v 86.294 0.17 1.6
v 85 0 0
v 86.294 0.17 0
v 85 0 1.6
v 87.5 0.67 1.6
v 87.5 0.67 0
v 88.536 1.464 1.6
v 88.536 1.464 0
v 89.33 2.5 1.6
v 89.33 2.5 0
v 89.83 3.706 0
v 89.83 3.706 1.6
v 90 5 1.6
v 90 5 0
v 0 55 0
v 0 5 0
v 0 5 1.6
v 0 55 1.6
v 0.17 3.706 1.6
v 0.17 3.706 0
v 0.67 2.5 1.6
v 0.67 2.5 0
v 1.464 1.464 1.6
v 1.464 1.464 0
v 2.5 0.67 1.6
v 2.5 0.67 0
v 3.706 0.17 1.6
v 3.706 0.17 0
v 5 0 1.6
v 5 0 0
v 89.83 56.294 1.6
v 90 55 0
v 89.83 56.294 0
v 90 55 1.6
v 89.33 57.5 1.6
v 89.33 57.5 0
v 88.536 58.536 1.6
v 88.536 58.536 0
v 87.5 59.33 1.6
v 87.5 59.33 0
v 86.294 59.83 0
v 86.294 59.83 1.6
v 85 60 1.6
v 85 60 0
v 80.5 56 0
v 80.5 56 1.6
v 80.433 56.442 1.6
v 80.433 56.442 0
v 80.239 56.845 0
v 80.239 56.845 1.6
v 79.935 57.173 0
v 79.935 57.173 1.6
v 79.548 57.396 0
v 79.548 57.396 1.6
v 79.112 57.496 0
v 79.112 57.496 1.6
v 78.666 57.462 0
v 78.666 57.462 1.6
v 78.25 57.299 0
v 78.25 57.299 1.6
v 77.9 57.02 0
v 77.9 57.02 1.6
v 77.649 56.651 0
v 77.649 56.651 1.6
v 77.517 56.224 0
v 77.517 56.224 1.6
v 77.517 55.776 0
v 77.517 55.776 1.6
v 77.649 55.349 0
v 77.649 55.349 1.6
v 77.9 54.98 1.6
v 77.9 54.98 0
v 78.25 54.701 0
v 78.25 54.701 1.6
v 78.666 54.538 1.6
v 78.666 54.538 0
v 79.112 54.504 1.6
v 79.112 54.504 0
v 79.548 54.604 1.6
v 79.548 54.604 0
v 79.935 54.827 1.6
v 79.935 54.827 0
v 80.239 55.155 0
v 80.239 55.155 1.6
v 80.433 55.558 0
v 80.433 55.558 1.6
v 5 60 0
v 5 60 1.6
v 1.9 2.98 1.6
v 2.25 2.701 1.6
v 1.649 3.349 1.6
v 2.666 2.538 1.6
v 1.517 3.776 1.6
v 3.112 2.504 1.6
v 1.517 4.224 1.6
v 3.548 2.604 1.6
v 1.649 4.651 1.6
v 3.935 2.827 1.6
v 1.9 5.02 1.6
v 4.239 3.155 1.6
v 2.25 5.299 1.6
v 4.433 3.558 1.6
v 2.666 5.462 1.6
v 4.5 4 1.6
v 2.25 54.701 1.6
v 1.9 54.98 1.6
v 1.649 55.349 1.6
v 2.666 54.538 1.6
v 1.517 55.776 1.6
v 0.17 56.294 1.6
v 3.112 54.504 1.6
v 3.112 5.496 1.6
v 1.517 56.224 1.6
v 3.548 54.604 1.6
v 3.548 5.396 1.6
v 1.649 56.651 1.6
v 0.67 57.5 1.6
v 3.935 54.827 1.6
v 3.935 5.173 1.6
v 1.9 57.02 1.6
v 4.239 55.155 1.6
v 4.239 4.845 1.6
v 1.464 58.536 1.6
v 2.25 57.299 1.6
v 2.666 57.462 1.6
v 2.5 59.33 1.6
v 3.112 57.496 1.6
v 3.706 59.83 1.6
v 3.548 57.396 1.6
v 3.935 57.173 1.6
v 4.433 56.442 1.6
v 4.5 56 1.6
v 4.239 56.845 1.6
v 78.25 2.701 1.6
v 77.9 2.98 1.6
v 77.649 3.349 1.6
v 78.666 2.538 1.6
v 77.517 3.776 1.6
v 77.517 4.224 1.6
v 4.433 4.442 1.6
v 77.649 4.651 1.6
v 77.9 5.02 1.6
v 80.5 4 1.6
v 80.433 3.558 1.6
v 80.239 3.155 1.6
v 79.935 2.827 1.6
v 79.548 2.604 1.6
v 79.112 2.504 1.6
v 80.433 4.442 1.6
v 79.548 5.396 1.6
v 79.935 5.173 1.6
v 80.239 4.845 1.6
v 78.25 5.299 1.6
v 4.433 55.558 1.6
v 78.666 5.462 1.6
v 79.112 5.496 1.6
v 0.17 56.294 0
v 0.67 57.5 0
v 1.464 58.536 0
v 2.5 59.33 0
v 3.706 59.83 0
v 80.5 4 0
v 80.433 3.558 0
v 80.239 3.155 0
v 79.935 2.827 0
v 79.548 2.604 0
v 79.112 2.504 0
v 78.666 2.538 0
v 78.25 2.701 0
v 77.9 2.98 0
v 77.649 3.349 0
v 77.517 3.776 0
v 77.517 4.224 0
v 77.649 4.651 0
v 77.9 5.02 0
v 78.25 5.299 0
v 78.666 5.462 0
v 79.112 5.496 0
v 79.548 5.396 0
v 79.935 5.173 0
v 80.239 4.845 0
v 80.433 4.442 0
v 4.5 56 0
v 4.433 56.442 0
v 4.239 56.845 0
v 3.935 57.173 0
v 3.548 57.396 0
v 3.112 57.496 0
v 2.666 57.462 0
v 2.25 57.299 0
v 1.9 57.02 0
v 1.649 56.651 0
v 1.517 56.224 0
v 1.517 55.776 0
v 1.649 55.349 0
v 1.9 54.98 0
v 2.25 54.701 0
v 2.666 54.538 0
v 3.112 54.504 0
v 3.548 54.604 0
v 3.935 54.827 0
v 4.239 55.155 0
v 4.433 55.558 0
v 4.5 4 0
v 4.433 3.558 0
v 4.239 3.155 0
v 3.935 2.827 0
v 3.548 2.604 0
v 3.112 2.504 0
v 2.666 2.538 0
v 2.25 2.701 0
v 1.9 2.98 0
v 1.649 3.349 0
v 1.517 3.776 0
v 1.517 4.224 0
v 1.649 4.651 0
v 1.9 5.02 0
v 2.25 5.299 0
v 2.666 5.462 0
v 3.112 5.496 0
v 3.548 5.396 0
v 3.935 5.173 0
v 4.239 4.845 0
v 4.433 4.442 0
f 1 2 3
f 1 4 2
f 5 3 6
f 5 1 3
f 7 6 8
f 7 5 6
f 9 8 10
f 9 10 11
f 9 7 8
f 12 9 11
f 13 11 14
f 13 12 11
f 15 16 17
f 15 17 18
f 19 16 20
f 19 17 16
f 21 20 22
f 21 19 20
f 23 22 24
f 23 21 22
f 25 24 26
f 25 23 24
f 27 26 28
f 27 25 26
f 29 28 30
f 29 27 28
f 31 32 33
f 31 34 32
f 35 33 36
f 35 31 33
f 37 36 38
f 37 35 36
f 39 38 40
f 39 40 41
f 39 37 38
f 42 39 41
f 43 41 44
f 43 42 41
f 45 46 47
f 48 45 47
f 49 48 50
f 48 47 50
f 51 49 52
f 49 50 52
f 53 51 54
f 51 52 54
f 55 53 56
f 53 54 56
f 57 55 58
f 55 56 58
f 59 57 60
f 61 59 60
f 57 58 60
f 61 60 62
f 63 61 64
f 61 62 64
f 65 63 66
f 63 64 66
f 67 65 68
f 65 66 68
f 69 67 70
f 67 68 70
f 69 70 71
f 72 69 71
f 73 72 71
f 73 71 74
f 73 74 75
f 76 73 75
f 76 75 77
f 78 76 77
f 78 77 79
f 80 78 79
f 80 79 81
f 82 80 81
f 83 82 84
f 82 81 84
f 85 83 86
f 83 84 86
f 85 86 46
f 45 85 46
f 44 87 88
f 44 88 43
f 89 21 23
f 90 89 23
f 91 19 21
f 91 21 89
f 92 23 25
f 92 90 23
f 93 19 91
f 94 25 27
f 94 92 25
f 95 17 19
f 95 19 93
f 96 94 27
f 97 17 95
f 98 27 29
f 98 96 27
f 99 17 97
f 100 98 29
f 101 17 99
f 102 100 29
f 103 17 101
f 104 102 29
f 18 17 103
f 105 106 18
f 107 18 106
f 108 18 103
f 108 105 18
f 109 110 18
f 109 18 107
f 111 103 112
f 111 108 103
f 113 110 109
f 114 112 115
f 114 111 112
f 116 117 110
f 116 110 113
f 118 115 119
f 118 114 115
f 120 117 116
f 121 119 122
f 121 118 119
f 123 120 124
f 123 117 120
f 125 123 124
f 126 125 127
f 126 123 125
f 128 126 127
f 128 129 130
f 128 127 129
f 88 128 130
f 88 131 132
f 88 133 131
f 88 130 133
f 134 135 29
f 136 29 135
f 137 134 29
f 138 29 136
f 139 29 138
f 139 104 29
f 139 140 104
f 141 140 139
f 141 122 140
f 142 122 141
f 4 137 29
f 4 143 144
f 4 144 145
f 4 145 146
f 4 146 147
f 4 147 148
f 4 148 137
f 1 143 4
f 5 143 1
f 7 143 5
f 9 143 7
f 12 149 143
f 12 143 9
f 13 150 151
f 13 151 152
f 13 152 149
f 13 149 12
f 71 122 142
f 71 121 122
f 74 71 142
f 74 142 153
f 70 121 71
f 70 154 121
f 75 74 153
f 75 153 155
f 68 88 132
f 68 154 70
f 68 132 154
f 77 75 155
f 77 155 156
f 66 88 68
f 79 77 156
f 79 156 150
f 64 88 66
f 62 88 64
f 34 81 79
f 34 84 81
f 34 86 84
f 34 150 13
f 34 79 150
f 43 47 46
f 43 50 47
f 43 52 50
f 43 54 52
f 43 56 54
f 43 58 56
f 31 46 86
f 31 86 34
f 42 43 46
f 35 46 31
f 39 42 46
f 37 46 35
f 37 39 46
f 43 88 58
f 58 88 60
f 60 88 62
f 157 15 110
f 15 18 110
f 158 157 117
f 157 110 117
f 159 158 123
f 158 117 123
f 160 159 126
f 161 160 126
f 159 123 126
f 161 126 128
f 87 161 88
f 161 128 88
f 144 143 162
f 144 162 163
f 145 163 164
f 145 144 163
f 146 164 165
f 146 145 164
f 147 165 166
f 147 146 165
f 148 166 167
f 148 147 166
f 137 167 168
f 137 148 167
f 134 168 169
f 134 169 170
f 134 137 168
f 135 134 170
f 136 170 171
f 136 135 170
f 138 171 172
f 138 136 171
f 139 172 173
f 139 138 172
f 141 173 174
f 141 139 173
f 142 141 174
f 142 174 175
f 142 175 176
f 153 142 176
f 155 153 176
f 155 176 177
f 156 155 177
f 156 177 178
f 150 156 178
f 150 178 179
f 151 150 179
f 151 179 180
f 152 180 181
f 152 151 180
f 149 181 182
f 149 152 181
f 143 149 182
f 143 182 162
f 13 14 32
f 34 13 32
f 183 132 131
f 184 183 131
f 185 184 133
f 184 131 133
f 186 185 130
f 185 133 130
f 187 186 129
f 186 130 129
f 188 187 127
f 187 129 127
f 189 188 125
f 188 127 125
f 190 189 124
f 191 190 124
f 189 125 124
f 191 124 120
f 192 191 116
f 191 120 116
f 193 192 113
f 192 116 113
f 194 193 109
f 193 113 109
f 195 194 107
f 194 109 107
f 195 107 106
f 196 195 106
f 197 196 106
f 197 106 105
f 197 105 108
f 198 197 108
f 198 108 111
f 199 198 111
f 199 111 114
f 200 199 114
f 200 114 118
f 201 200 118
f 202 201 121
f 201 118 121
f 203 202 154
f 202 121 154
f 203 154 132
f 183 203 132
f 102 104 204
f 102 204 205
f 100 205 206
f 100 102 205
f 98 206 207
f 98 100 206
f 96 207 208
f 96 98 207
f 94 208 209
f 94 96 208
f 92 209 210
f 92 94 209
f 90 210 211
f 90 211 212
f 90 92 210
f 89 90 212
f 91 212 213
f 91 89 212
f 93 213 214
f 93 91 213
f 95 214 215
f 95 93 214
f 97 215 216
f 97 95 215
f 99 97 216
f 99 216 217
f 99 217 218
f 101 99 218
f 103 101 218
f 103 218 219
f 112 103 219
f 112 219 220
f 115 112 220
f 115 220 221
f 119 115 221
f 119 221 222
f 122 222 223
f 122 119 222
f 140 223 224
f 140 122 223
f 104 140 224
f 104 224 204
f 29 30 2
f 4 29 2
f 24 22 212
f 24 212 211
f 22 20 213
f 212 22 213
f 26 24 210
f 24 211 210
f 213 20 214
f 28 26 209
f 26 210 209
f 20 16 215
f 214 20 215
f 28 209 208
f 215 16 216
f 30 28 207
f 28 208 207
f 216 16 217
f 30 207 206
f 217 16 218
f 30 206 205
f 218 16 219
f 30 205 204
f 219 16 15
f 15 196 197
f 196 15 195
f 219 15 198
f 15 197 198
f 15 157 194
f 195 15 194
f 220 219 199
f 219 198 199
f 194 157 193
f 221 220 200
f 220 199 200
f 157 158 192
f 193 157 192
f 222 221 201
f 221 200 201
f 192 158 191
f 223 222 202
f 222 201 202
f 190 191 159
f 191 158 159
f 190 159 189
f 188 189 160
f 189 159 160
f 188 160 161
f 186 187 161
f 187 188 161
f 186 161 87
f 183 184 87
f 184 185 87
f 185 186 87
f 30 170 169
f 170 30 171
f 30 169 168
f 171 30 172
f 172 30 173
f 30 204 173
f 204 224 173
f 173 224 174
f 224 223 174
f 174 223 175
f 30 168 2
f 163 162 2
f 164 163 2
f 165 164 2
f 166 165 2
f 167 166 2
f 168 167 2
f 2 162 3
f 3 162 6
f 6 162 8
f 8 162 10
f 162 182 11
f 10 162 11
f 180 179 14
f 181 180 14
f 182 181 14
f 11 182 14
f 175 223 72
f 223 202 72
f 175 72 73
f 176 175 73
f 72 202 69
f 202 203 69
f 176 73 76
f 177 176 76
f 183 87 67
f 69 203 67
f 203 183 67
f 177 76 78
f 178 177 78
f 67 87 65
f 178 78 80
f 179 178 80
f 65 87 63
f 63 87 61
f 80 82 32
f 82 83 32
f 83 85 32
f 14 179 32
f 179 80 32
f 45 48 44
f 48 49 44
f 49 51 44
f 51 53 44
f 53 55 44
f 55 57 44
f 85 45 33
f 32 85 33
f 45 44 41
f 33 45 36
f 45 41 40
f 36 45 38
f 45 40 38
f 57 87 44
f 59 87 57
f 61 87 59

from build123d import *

# Parameters (mm, degrees)
SKETCH1_W           = 90
SKETCH1_H           = 60
BOSS_EXTRUDE1_DEPTH = 1.6
FILLET1_R           = 5
SKETCH2_R           = 1.5
CUT_EXTRUDE1_DEPTH  = 1.6


with BuildPart() as part:
    # Sketch1 → Boss-Extrude1 (new body)
    with BuildSketch(Plane.XY):
        with Locations((45, 30)):
            Rectangle(SKETCH1_W, SKETCH1_H)
    extrude(amount=BOSS_EXTRUDE1_DEPTH)

    # Fillet1
    fillet1_edges = [part.edges().sort_by_distance(p)[0] for p in [
        (0, 60, 0.8),
        (90, 60, 0.8),
        (90, 0, 0.8),
        (0, 0, 0.8),
    ]]
    fillet(fillet1_edges, radius=FILLET1_R)

    # Sketch2 → Cut-Extrude1 (cut)
    with BuildSketch(Plane.XY.offset(1.6)):
        with Locations((79, 56)):
            Circle(SKETCH2_R)
        with Locations((3, 56)):
            Circle(SKETCH2_R)
    cut_extrude1 = extrude(amount=-CUT_EXTRUDE1_DEPTH, mode=Mode.SUBTRACT)

    # Mirror1: Cut-Extrude1 across plane
    add(cut_extrude1.mirror(Plane(origin=(0, 30, 0), x_dir=(0, 0, 1), z_dir=(0, -1, 0))), mode=Mode.SUBTRACT)


solid = part.part
